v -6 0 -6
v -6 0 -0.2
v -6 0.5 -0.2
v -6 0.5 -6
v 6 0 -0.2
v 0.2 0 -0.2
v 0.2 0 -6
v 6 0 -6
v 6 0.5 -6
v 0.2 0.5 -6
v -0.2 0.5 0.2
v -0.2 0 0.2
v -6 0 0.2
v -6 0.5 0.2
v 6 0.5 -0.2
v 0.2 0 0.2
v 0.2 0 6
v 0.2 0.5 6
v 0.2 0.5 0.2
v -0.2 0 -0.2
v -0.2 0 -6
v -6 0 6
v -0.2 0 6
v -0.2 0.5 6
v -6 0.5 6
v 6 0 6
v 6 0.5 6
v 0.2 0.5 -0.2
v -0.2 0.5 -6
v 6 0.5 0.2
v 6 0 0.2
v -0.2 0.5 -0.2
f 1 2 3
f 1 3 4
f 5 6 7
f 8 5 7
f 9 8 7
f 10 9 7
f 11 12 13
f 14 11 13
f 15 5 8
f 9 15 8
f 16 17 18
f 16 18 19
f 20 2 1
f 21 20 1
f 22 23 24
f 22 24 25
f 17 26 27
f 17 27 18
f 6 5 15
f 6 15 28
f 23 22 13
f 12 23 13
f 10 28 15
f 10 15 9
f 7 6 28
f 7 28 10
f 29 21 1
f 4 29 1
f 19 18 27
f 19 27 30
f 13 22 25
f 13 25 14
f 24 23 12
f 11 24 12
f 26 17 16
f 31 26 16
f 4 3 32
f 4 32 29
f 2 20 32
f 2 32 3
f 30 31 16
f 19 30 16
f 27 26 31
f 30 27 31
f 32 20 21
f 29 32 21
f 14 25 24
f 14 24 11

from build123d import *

# Parameters (mm, degrees)
SKETCH_3_W        = 5.8
SKETCH_3_H        = 5.8
EXTRUDE_1_DEPTH   = 0.5
EXTRUDE_1_2_DEPTH = 0.5
EXTRUDE_1_3_DEPTH = 0.5
EXTRUDE_1_4_DEPTH = 0.5
MOVE_BODY_2_ANGLE = 90


with BuildPart() as part:
    # 草图3 → 凸台-拉伸1 (new body)
    with BuildSketch(Plane(origin=(0, 0, 0), x_dir=(0, 0, -1), z_dir=(1, 0, 0))):
        with Locations((3.1, 3.1)):
            Rectangle(SKETCH_3_W, SKETCH_3_H)
    extrude(amount=EXTRUDE_1_DEPTH)


with BuildPart() as body_2:
    # 草图3 → Extrude 1 2 (new body)
    with BuildSketch(Plane(origin=(0, 0, 0), x_dir=(0, 0, -1), z_dir=(1, 0, 0))):
        with Locations((-3.1, -3.1)):
            Rectangle(SKETCH_3_W, SKETCH_3_H)
    extrude(amount=EXTRUDE_1_2_DEPTH)


with BuildPart() as body_3:
    # 草图3 → Extrude 1 3 (new body)
    with BuildSketch(Plane(origin=(0, 0, 0), x_dir=(0, 0, -1), z_dir=(1, 0, 0))):
        with Locations((3.1, -3.1)):
            Rectangle(SKETCH_3_W, SKETCH_3_H)
    extrude(amount=EXTRUDE_1_3_DEPTH)


with BuildPart() as body_4:
    # 草图3 → Extrude 1 4 (new body)
    with BuildSketch(Plane(origin=(0, 0, 0), x_dir=(0, 0, -1), z_dir=(1, 0, 0))):
        with Locations((-3.1, 3.1)):
            Rectangle(SKETCH_3_W, SKETCH_3_H)
    extrude(amount=EXTRUDE_1_4_DEPTH)


with BuildPart() as body_2_1:
    # Move Body 2: moved
    add(body_2.part.rotate(Axis((0, 0, 0), (0, 0, 1)), MOVE_BODY_2_ANGLE))


with BuildPart() as body_4_1:
    # Move Body 2: moved
    add(body_4.part.rotate(Axis((0, 0, 0), (0, 0, 1)), MOVE_BODY_2_ANGLE))


with BuildPart() as part_1:
    # Move Body 2: moved
    add(part.part.rotate(Axis((0, 0, 0), (0, 0, 1)), MOVE_BODY_2_ANGLE))


with BuildPart() as body_3_1:
    # Move Body 2: moved
    add(body_3.part.rotate(Axis((0, 0, 0), (0, 0, 1)), MOVE_BODY_2_ANGLE))


solid = Compound([body_2_1.part, body_4_1.part, part_1.part, body_3_1.part])
